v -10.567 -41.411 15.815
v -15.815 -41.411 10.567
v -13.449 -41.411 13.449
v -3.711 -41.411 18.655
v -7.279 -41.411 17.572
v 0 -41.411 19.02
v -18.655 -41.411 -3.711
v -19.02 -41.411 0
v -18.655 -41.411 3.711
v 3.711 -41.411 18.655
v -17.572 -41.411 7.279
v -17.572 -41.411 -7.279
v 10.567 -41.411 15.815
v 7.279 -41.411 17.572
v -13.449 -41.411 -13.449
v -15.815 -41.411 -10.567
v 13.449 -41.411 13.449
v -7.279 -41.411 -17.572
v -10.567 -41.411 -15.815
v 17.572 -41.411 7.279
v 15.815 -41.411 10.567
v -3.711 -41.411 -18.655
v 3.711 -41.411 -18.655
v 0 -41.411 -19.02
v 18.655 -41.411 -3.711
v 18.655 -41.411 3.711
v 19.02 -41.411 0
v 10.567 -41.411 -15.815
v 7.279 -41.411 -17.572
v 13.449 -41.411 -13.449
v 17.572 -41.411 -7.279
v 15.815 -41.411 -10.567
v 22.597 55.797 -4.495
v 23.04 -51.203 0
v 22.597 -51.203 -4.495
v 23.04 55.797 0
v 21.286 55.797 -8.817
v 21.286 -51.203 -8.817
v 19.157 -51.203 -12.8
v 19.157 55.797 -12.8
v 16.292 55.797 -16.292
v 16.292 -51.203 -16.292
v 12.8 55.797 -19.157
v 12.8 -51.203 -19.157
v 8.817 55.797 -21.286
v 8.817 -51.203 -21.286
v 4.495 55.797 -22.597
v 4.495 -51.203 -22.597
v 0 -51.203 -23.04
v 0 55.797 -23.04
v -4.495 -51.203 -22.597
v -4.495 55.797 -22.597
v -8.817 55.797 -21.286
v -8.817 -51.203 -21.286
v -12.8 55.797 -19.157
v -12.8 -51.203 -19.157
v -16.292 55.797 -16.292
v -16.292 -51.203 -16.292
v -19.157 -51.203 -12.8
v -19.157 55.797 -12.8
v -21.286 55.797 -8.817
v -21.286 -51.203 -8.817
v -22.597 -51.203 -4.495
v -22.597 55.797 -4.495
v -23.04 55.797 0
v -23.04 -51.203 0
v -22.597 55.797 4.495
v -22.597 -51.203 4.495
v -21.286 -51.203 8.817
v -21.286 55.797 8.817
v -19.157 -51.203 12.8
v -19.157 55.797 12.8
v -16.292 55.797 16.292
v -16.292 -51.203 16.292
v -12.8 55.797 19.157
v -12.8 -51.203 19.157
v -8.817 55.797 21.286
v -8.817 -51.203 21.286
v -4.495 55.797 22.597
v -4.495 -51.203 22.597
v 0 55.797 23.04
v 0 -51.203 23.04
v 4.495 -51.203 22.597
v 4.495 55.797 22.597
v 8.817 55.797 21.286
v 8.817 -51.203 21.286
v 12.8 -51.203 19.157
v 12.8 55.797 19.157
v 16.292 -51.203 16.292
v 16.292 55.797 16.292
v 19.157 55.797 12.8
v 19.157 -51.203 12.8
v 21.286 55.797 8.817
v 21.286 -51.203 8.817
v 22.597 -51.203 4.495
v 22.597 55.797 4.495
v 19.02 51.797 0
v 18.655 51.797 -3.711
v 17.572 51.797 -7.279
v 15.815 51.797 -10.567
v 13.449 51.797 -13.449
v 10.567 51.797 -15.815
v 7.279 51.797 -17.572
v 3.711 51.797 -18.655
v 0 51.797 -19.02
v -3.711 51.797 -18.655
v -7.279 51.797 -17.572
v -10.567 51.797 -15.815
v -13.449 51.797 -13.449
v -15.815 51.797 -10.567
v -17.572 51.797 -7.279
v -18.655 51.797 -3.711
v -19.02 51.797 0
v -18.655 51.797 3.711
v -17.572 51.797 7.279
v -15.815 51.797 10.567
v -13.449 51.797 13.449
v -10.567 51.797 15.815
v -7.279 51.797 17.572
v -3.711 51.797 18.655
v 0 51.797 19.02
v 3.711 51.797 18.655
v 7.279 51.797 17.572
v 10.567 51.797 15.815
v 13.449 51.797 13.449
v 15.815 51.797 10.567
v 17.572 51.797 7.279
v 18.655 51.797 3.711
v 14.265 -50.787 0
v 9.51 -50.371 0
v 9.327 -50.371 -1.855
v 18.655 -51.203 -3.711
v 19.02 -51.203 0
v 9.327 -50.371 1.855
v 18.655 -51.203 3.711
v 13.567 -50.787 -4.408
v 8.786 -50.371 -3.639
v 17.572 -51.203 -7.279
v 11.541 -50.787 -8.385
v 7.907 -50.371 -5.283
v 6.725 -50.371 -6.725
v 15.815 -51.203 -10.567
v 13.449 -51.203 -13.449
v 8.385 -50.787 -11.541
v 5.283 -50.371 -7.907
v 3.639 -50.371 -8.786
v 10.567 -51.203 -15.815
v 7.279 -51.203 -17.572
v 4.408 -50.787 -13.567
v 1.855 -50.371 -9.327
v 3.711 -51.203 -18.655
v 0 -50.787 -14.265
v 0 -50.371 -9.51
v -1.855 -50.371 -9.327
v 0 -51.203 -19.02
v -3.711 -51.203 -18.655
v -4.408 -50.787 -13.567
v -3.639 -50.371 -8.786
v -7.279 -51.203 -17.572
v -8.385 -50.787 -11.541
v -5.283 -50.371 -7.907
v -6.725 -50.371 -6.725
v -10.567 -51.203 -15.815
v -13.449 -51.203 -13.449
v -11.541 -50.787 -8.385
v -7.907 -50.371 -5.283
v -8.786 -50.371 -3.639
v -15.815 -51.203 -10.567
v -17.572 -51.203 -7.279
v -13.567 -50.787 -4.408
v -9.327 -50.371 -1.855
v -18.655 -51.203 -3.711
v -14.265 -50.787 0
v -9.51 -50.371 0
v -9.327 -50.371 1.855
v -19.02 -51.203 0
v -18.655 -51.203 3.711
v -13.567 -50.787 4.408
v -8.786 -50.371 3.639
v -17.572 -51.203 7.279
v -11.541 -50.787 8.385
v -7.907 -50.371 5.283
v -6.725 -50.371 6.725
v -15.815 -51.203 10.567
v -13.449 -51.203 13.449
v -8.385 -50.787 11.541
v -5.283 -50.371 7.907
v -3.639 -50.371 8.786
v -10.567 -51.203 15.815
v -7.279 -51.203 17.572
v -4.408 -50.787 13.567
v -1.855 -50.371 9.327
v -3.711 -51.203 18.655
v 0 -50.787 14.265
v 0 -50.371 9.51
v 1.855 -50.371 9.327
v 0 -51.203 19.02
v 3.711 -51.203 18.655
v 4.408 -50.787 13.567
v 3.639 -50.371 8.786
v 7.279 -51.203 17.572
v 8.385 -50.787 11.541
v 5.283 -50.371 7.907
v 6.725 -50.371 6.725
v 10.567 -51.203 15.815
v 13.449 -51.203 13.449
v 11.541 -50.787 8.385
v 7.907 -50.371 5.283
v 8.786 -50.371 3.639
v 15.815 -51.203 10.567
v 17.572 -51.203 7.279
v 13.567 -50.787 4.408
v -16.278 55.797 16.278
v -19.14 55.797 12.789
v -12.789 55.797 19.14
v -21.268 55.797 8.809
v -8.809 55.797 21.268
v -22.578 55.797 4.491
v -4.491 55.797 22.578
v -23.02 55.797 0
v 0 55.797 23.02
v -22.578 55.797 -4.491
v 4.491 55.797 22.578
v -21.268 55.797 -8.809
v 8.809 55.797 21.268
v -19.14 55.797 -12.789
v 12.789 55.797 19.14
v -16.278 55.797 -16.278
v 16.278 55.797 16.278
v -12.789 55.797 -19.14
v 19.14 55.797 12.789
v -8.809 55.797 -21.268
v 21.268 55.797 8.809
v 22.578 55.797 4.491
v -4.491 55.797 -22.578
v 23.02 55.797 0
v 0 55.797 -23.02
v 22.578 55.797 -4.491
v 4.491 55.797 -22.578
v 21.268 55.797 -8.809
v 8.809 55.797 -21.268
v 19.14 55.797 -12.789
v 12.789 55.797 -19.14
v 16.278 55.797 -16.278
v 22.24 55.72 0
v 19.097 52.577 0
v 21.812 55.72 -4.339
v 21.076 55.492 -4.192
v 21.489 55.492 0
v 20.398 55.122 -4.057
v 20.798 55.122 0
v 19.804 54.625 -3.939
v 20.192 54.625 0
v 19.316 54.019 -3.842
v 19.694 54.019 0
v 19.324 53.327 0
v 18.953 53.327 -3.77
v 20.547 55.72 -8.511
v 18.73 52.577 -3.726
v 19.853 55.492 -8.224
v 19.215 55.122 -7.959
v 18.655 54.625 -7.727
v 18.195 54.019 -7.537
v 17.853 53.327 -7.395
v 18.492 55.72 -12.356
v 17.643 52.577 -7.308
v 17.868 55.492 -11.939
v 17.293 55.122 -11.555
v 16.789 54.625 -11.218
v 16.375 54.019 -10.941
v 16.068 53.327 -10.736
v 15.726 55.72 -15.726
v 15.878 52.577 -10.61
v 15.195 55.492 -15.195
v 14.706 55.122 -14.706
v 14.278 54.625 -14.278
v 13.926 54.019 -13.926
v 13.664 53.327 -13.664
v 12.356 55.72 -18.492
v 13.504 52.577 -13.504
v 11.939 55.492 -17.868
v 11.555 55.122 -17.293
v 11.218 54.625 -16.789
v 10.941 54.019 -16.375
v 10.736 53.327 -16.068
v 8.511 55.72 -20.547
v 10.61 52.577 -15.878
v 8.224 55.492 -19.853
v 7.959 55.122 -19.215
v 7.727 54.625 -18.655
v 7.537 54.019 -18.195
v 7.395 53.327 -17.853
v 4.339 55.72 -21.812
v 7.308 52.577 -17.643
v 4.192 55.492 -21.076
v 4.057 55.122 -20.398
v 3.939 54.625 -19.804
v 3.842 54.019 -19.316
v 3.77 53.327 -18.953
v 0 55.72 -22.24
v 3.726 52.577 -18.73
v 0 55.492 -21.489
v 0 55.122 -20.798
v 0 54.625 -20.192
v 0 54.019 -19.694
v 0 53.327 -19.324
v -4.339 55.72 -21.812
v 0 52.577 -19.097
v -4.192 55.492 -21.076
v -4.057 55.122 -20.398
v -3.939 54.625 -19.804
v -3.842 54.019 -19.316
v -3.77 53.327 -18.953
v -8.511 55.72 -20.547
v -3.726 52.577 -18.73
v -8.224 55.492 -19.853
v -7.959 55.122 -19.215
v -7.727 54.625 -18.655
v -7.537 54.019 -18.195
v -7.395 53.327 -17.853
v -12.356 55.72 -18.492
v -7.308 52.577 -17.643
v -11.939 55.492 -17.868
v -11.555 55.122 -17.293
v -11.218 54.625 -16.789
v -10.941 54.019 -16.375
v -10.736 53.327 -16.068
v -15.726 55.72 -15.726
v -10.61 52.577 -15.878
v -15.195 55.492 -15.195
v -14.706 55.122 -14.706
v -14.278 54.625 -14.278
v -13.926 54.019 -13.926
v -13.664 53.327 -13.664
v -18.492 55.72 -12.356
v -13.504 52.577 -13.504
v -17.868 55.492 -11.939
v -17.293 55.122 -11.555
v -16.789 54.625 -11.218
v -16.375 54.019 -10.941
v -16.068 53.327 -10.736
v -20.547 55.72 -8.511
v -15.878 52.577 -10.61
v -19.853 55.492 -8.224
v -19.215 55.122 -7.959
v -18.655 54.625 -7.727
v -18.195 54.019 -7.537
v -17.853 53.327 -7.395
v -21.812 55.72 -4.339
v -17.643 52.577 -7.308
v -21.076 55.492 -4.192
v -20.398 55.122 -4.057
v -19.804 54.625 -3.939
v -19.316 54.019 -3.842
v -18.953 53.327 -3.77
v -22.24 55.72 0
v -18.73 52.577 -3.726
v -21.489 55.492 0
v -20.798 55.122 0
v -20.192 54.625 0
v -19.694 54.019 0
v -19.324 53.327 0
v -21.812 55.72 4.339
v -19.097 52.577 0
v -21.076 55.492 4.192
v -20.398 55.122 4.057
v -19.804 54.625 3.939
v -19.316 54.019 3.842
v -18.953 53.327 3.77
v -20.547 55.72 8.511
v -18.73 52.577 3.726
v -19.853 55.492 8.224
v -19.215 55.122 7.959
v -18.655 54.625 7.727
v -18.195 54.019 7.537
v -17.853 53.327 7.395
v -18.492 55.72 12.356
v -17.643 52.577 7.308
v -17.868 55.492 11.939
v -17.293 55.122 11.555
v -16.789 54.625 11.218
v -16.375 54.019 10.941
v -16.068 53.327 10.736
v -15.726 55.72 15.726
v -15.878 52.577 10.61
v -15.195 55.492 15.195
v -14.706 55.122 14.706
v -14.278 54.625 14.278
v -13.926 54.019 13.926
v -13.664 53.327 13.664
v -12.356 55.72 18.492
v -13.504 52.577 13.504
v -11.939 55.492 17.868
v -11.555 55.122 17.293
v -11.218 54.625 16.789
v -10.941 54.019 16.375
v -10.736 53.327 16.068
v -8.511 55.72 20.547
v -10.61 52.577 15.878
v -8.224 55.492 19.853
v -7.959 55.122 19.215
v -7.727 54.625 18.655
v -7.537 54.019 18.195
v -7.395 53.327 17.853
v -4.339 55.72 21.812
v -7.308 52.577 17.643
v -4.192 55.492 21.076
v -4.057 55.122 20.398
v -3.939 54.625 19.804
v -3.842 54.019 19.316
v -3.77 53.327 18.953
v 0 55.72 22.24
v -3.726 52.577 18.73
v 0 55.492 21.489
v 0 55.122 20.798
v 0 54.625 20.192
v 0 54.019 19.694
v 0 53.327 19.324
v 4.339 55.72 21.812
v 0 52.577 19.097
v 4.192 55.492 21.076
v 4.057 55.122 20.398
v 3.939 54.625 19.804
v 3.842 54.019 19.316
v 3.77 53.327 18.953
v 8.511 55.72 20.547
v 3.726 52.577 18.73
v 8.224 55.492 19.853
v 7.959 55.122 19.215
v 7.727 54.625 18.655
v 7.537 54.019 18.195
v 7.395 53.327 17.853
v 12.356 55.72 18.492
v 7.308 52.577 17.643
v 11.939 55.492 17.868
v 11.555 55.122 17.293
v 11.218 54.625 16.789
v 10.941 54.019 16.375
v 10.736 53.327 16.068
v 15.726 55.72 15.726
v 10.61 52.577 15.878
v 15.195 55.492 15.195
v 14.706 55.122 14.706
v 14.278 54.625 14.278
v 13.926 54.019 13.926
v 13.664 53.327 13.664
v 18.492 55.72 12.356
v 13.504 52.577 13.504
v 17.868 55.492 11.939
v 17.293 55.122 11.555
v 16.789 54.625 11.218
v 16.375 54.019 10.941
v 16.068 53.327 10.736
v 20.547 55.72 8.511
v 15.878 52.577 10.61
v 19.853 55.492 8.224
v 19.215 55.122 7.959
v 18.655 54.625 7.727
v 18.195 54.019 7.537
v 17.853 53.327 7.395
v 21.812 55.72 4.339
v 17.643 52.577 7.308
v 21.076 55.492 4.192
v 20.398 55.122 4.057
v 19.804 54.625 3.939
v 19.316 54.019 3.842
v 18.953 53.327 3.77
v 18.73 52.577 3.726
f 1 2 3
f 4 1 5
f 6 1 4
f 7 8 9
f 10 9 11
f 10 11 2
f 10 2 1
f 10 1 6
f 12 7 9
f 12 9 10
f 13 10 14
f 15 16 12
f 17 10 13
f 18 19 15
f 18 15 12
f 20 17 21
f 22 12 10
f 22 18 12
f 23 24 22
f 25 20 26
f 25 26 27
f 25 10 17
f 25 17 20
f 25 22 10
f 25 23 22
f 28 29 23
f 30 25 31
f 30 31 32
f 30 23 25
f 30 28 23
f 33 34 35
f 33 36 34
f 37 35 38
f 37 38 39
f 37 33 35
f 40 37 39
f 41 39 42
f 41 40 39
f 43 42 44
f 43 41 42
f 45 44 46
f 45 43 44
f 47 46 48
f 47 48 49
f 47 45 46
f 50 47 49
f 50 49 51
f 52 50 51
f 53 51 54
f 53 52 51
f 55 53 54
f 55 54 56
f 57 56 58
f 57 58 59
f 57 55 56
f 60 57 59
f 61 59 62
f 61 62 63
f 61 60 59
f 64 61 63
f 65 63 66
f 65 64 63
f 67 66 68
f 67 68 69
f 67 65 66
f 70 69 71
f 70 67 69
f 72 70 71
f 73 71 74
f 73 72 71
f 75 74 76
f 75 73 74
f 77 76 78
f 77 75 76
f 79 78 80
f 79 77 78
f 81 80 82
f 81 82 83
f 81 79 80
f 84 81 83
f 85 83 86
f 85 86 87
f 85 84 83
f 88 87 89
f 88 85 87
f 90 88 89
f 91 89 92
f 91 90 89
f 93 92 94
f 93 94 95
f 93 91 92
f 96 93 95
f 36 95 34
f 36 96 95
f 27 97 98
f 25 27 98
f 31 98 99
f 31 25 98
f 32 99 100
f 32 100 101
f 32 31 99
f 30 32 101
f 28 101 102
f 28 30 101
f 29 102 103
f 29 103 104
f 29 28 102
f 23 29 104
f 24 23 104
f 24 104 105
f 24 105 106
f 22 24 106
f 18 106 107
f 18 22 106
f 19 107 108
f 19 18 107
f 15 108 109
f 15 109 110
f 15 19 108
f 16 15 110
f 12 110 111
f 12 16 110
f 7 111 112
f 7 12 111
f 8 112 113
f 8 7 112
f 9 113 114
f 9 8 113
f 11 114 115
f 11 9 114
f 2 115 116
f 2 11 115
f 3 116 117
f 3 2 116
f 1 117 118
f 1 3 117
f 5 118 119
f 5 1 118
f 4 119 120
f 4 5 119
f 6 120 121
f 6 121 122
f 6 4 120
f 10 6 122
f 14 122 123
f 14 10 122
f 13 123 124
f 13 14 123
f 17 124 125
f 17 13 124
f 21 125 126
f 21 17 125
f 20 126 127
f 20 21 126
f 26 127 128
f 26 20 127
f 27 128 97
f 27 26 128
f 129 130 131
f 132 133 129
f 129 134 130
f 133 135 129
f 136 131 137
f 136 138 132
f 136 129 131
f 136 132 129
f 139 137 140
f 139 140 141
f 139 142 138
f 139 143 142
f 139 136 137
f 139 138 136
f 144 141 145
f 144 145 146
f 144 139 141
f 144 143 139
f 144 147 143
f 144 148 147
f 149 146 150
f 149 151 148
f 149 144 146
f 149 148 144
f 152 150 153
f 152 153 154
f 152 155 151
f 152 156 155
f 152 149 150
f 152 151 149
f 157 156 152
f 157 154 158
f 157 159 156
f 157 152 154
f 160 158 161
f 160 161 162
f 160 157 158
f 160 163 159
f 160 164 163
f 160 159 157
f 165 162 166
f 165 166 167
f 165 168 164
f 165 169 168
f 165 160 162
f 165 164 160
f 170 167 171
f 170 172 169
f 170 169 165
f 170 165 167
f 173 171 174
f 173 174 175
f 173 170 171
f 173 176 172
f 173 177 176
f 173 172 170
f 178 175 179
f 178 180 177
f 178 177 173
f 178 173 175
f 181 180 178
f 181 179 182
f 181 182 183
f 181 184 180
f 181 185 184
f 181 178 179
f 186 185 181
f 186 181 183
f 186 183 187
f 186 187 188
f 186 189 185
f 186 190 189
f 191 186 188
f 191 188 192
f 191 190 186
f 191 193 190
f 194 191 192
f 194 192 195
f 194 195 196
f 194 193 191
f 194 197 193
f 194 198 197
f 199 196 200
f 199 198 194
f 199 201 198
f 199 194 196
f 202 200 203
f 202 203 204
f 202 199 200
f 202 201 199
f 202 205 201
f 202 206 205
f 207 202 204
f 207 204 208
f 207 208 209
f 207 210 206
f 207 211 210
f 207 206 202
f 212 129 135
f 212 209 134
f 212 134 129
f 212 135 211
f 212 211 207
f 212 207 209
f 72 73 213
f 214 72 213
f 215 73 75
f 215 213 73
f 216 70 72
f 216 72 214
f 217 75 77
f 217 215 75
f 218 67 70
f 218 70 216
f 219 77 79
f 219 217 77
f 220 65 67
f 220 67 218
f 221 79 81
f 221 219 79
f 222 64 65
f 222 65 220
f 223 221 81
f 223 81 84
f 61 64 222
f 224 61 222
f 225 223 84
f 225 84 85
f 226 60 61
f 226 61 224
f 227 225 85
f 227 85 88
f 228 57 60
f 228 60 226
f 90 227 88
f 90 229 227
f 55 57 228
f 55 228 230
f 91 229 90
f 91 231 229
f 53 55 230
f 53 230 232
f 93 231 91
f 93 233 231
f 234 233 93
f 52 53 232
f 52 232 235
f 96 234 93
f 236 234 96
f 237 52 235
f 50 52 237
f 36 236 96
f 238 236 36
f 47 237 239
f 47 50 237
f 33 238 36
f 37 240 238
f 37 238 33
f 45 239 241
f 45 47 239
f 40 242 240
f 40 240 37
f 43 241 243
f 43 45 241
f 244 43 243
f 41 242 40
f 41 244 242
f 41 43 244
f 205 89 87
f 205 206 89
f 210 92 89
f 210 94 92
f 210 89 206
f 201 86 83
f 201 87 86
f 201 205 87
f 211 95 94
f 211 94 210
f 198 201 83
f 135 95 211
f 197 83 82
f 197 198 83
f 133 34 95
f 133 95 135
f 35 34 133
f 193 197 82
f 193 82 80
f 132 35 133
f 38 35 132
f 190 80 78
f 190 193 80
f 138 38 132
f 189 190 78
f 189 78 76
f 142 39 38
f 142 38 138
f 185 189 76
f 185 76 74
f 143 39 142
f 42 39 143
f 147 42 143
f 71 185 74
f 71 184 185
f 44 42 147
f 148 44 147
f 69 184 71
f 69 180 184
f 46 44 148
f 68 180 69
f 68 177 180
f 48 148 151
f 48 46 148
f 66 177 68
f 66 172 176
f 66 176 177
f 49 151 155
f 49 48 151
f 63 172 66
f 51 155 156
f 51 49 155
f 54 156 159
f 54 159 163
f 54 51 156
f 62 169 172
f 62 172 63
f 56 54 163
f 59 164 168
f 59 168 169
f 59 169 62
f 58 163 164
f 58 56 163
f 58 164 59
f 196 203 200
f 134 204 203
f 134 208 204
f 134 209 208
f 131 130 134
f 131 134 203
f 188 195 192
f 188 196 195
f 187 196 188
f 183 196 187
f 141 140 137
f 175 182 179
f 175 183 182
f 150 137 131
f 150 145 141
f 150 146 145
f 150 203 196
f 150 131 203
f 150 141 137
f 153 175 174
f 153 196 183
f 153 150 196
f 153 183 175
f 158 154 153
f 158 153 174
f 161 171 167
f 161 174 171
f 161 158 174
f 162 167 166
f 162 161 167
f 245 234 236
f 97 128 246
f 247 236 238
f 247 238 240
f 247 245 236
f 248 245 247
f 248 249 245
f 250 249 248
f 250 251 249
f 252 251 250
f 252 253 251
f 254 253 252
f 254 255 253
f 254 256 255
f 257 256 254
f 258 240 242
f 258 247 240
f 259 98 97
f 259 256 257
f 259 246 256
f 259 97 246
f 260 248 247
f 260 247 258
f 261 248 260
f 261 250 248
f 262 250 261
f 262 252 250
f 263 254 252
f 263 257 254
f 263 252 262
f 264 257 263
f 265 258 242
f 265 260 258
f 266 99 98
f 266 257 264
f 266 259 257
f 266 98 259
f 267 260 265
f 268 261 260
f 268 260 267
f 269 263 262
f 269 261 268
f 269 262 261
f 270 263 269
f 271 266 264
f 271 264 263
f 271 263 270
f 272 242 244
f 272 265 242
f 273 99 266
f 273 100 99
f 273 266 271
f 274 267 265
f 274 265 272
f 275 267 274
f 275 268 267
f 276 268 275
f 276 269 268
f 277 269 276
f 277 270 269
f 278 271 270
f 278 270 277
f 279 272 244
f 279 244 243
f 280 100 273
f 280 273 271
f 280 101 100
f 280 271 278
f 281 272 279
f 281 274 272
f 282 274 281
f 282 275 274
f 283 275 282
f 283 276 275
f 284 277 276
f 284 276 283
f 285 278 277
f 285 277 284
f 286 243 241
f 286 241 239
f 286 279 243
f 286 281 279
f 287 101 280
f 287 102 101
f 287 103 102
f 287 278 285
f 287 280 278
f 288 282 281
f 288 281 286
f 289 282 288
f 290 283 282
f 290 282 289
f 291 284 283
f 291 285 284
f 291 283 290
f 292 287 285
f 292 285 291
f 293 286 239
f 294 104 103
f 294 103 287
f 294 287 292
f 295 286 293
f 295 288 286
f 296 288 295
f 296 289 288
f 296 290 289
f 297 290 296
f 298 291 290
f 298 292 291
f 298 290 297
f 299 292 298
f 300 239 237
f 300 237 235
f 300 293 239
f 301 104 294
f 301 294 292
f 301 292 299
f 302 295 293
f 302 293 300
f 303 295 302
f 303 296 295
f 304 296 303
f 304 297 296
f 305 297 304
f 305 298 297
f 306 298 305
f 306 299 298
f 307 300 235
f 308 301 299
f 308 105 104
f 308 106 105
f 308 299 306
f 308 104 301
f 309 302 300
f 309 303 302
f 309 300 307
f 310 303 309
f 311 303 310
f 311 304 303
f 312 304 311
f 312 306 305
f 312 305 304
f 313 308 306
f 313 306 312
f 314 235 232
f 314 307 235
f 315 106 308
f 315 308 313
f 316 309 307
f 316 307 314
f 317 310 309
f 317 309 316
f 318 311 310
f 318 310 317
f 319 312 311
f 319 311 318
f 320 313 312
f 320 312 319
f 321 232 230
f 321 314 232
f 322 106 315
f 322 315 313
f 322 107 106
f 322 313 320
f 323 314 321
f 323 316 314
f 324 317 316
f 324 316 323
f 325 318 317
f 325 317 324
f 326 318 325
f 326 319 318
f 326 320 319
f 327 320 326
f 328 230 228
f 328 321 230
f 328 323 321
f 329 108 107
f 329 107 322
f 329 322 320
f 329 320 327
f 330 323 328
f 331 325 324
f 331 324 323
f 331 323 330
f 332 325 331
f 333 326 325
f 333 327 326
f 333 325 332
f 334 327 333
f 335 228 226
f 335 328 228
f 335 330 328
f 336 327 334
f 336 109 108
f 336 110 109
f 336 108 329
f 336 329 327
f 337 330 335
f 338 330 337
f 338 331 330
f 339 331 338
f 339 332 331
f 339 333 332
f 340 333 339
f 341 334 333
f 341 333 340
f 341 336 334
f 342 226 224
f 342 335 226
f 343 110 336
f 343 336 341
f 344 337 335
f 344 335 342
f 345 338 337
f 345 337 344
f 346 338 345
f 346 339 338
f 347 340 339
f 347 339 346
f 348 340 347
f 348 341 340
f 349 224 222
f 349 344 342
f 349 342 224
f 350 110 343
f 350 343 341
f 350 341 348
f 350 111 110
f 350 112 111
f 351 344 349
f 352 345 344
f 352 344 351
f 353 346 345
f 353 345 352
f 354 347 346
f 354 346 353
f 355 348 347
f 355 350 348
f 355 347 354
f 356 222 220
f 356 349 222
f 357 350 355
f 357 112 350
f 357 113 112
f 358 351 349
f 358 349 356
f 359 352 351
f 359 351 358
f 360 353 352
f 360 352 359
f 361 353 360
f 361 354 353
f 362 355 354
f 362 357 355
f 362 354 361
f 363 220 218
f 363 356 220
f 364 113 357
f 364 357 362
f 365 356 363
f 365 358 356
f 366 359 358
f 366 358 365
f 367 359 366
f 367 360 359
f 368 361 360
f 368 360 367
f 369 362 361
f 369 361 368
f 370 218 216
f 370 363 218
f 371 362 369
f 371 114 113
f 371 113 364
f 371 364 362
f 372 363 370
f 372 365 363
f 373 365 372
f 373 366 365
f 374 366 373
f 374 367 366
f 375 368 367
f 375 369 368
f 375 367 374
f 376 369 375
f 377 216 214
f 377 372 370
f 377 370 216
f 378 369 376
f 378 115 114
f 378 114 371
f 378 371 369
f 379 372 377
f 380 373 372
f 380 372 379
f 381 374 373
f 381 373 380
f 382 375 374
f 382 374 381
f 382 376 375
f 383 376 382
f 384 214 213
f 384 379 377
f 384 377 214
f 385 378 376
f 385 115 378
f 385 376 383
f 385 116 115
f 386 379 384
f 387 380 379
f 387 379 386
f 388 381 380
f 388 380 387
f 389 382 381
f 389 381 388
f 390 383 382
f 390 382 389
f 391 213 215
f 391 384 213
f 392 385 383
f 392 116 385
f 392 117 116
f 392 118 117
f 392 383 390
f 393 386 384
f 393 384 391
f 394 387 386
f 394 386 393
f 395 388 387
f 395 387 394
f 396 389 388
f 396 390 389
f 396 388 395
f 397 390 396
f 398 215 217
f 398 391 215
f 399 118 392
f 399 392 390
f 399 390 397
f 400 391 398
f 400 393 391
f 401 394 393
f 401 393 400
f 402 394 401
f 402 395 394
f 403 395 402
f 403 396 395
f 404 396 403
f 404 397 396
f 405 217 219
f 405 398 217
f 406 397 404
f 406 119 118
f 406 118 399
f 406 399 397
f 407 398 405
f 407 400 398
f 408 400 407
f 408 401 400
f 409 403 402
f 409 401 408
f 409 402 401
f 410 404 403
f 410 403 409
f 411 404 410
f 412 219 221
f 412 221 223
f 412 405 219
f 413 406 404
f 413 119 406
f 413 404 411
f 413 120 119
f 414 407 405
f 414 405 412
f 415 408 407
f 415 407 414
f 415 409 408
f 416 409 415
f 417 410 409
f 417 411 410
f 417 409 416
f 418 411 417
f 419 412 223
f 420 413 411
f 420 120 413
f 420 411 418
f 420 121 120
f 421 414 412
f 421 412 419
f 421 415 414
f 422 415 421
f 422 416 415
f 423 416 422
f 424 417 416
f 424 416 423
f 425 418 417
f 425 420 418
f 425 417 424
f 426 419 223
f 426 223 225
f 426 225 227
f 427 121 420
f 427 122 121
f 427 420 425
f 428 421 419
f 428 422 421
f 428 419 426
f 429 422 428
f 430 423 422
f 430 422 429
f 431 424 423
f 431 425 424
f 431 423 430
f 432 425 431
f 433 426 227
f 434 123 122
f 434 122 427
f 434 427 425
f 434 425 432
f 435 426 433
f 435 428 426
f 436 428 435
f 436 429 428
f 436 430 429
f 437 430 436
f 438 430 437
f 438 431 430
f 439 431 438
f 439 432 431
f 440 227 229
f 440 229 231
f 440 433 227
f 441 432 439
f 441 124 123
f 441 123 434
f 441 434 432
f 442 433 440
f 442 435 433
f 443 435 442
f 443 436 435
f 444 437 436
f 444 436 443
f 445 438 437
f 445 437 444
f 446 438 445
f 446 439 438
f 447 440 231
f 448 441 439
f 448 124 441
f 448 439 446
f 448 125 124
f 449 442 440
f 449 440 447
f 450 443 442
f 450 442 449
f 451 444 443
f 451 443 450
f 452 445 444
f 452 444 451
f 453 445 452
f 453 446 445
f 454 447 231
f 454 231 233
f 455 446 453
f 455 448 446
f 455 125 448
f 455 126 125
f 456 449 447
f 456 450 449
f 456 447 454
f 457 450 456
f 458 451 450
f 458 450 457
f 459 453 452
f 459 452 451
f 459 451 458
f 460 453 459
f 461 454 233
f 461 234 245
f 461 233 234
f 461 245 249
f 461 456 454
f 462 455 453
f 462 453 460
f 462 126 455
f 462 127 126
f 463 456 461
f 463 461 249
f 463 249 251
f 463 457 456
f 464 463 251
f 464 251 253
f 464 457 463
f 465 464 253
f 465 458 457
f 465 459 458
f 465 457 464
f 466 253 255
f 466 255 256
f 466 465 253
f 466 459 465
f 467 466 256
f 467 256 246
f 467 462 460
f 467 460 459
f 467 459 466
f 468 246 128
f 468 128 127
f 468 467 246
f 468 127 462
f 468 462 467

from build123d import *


with BuildPart() as part:
    # Szkic1 → Obrót1 (revolve)
    with BuildSketch(Plane.XY, mode=Mode.PRIVATE) as obr_t1_sk:
        with BuildLine():
            Line((-19.02, -51.203493976), (-22.04, -51.203493976))
            Line((-22.04, -51.203493976), (-23.04, -51.203493976))
            Line((-23.04, -51.203493976), (-23.04, -50.203493976))
            Line((-23.04, -50.203493976), (-23.04, 55.796506024))
            Line((-23.04, 55.796506024), (-23.02, 55.796506024))
            ThreePointArc((-23.02, 55.796506024), (-20.191572875, 54.624933149), (-19.02, 51.796506024))
            Line((-19.02, 51.796506024), (-19.02, -41.411476786))
            Line((-19.02, -41.411476786), (0, -41.411476786))
            Line((0, -41.411476786), (0, -50.371476786))
            Line((0, -50.371476786), (-9.51, -50.371476786))
            Line((-9.51, -50.371476786), (-19.02, -51.203493976))
        make_face()
    revolve(obr_t1_sk.sketch.rotate(Axis((0, -51.853493976, 0), (0, 1, 0)), 180), axis=Axis((0, -51.853493976, 0), (0, 1, 0)))


solid = part.part
